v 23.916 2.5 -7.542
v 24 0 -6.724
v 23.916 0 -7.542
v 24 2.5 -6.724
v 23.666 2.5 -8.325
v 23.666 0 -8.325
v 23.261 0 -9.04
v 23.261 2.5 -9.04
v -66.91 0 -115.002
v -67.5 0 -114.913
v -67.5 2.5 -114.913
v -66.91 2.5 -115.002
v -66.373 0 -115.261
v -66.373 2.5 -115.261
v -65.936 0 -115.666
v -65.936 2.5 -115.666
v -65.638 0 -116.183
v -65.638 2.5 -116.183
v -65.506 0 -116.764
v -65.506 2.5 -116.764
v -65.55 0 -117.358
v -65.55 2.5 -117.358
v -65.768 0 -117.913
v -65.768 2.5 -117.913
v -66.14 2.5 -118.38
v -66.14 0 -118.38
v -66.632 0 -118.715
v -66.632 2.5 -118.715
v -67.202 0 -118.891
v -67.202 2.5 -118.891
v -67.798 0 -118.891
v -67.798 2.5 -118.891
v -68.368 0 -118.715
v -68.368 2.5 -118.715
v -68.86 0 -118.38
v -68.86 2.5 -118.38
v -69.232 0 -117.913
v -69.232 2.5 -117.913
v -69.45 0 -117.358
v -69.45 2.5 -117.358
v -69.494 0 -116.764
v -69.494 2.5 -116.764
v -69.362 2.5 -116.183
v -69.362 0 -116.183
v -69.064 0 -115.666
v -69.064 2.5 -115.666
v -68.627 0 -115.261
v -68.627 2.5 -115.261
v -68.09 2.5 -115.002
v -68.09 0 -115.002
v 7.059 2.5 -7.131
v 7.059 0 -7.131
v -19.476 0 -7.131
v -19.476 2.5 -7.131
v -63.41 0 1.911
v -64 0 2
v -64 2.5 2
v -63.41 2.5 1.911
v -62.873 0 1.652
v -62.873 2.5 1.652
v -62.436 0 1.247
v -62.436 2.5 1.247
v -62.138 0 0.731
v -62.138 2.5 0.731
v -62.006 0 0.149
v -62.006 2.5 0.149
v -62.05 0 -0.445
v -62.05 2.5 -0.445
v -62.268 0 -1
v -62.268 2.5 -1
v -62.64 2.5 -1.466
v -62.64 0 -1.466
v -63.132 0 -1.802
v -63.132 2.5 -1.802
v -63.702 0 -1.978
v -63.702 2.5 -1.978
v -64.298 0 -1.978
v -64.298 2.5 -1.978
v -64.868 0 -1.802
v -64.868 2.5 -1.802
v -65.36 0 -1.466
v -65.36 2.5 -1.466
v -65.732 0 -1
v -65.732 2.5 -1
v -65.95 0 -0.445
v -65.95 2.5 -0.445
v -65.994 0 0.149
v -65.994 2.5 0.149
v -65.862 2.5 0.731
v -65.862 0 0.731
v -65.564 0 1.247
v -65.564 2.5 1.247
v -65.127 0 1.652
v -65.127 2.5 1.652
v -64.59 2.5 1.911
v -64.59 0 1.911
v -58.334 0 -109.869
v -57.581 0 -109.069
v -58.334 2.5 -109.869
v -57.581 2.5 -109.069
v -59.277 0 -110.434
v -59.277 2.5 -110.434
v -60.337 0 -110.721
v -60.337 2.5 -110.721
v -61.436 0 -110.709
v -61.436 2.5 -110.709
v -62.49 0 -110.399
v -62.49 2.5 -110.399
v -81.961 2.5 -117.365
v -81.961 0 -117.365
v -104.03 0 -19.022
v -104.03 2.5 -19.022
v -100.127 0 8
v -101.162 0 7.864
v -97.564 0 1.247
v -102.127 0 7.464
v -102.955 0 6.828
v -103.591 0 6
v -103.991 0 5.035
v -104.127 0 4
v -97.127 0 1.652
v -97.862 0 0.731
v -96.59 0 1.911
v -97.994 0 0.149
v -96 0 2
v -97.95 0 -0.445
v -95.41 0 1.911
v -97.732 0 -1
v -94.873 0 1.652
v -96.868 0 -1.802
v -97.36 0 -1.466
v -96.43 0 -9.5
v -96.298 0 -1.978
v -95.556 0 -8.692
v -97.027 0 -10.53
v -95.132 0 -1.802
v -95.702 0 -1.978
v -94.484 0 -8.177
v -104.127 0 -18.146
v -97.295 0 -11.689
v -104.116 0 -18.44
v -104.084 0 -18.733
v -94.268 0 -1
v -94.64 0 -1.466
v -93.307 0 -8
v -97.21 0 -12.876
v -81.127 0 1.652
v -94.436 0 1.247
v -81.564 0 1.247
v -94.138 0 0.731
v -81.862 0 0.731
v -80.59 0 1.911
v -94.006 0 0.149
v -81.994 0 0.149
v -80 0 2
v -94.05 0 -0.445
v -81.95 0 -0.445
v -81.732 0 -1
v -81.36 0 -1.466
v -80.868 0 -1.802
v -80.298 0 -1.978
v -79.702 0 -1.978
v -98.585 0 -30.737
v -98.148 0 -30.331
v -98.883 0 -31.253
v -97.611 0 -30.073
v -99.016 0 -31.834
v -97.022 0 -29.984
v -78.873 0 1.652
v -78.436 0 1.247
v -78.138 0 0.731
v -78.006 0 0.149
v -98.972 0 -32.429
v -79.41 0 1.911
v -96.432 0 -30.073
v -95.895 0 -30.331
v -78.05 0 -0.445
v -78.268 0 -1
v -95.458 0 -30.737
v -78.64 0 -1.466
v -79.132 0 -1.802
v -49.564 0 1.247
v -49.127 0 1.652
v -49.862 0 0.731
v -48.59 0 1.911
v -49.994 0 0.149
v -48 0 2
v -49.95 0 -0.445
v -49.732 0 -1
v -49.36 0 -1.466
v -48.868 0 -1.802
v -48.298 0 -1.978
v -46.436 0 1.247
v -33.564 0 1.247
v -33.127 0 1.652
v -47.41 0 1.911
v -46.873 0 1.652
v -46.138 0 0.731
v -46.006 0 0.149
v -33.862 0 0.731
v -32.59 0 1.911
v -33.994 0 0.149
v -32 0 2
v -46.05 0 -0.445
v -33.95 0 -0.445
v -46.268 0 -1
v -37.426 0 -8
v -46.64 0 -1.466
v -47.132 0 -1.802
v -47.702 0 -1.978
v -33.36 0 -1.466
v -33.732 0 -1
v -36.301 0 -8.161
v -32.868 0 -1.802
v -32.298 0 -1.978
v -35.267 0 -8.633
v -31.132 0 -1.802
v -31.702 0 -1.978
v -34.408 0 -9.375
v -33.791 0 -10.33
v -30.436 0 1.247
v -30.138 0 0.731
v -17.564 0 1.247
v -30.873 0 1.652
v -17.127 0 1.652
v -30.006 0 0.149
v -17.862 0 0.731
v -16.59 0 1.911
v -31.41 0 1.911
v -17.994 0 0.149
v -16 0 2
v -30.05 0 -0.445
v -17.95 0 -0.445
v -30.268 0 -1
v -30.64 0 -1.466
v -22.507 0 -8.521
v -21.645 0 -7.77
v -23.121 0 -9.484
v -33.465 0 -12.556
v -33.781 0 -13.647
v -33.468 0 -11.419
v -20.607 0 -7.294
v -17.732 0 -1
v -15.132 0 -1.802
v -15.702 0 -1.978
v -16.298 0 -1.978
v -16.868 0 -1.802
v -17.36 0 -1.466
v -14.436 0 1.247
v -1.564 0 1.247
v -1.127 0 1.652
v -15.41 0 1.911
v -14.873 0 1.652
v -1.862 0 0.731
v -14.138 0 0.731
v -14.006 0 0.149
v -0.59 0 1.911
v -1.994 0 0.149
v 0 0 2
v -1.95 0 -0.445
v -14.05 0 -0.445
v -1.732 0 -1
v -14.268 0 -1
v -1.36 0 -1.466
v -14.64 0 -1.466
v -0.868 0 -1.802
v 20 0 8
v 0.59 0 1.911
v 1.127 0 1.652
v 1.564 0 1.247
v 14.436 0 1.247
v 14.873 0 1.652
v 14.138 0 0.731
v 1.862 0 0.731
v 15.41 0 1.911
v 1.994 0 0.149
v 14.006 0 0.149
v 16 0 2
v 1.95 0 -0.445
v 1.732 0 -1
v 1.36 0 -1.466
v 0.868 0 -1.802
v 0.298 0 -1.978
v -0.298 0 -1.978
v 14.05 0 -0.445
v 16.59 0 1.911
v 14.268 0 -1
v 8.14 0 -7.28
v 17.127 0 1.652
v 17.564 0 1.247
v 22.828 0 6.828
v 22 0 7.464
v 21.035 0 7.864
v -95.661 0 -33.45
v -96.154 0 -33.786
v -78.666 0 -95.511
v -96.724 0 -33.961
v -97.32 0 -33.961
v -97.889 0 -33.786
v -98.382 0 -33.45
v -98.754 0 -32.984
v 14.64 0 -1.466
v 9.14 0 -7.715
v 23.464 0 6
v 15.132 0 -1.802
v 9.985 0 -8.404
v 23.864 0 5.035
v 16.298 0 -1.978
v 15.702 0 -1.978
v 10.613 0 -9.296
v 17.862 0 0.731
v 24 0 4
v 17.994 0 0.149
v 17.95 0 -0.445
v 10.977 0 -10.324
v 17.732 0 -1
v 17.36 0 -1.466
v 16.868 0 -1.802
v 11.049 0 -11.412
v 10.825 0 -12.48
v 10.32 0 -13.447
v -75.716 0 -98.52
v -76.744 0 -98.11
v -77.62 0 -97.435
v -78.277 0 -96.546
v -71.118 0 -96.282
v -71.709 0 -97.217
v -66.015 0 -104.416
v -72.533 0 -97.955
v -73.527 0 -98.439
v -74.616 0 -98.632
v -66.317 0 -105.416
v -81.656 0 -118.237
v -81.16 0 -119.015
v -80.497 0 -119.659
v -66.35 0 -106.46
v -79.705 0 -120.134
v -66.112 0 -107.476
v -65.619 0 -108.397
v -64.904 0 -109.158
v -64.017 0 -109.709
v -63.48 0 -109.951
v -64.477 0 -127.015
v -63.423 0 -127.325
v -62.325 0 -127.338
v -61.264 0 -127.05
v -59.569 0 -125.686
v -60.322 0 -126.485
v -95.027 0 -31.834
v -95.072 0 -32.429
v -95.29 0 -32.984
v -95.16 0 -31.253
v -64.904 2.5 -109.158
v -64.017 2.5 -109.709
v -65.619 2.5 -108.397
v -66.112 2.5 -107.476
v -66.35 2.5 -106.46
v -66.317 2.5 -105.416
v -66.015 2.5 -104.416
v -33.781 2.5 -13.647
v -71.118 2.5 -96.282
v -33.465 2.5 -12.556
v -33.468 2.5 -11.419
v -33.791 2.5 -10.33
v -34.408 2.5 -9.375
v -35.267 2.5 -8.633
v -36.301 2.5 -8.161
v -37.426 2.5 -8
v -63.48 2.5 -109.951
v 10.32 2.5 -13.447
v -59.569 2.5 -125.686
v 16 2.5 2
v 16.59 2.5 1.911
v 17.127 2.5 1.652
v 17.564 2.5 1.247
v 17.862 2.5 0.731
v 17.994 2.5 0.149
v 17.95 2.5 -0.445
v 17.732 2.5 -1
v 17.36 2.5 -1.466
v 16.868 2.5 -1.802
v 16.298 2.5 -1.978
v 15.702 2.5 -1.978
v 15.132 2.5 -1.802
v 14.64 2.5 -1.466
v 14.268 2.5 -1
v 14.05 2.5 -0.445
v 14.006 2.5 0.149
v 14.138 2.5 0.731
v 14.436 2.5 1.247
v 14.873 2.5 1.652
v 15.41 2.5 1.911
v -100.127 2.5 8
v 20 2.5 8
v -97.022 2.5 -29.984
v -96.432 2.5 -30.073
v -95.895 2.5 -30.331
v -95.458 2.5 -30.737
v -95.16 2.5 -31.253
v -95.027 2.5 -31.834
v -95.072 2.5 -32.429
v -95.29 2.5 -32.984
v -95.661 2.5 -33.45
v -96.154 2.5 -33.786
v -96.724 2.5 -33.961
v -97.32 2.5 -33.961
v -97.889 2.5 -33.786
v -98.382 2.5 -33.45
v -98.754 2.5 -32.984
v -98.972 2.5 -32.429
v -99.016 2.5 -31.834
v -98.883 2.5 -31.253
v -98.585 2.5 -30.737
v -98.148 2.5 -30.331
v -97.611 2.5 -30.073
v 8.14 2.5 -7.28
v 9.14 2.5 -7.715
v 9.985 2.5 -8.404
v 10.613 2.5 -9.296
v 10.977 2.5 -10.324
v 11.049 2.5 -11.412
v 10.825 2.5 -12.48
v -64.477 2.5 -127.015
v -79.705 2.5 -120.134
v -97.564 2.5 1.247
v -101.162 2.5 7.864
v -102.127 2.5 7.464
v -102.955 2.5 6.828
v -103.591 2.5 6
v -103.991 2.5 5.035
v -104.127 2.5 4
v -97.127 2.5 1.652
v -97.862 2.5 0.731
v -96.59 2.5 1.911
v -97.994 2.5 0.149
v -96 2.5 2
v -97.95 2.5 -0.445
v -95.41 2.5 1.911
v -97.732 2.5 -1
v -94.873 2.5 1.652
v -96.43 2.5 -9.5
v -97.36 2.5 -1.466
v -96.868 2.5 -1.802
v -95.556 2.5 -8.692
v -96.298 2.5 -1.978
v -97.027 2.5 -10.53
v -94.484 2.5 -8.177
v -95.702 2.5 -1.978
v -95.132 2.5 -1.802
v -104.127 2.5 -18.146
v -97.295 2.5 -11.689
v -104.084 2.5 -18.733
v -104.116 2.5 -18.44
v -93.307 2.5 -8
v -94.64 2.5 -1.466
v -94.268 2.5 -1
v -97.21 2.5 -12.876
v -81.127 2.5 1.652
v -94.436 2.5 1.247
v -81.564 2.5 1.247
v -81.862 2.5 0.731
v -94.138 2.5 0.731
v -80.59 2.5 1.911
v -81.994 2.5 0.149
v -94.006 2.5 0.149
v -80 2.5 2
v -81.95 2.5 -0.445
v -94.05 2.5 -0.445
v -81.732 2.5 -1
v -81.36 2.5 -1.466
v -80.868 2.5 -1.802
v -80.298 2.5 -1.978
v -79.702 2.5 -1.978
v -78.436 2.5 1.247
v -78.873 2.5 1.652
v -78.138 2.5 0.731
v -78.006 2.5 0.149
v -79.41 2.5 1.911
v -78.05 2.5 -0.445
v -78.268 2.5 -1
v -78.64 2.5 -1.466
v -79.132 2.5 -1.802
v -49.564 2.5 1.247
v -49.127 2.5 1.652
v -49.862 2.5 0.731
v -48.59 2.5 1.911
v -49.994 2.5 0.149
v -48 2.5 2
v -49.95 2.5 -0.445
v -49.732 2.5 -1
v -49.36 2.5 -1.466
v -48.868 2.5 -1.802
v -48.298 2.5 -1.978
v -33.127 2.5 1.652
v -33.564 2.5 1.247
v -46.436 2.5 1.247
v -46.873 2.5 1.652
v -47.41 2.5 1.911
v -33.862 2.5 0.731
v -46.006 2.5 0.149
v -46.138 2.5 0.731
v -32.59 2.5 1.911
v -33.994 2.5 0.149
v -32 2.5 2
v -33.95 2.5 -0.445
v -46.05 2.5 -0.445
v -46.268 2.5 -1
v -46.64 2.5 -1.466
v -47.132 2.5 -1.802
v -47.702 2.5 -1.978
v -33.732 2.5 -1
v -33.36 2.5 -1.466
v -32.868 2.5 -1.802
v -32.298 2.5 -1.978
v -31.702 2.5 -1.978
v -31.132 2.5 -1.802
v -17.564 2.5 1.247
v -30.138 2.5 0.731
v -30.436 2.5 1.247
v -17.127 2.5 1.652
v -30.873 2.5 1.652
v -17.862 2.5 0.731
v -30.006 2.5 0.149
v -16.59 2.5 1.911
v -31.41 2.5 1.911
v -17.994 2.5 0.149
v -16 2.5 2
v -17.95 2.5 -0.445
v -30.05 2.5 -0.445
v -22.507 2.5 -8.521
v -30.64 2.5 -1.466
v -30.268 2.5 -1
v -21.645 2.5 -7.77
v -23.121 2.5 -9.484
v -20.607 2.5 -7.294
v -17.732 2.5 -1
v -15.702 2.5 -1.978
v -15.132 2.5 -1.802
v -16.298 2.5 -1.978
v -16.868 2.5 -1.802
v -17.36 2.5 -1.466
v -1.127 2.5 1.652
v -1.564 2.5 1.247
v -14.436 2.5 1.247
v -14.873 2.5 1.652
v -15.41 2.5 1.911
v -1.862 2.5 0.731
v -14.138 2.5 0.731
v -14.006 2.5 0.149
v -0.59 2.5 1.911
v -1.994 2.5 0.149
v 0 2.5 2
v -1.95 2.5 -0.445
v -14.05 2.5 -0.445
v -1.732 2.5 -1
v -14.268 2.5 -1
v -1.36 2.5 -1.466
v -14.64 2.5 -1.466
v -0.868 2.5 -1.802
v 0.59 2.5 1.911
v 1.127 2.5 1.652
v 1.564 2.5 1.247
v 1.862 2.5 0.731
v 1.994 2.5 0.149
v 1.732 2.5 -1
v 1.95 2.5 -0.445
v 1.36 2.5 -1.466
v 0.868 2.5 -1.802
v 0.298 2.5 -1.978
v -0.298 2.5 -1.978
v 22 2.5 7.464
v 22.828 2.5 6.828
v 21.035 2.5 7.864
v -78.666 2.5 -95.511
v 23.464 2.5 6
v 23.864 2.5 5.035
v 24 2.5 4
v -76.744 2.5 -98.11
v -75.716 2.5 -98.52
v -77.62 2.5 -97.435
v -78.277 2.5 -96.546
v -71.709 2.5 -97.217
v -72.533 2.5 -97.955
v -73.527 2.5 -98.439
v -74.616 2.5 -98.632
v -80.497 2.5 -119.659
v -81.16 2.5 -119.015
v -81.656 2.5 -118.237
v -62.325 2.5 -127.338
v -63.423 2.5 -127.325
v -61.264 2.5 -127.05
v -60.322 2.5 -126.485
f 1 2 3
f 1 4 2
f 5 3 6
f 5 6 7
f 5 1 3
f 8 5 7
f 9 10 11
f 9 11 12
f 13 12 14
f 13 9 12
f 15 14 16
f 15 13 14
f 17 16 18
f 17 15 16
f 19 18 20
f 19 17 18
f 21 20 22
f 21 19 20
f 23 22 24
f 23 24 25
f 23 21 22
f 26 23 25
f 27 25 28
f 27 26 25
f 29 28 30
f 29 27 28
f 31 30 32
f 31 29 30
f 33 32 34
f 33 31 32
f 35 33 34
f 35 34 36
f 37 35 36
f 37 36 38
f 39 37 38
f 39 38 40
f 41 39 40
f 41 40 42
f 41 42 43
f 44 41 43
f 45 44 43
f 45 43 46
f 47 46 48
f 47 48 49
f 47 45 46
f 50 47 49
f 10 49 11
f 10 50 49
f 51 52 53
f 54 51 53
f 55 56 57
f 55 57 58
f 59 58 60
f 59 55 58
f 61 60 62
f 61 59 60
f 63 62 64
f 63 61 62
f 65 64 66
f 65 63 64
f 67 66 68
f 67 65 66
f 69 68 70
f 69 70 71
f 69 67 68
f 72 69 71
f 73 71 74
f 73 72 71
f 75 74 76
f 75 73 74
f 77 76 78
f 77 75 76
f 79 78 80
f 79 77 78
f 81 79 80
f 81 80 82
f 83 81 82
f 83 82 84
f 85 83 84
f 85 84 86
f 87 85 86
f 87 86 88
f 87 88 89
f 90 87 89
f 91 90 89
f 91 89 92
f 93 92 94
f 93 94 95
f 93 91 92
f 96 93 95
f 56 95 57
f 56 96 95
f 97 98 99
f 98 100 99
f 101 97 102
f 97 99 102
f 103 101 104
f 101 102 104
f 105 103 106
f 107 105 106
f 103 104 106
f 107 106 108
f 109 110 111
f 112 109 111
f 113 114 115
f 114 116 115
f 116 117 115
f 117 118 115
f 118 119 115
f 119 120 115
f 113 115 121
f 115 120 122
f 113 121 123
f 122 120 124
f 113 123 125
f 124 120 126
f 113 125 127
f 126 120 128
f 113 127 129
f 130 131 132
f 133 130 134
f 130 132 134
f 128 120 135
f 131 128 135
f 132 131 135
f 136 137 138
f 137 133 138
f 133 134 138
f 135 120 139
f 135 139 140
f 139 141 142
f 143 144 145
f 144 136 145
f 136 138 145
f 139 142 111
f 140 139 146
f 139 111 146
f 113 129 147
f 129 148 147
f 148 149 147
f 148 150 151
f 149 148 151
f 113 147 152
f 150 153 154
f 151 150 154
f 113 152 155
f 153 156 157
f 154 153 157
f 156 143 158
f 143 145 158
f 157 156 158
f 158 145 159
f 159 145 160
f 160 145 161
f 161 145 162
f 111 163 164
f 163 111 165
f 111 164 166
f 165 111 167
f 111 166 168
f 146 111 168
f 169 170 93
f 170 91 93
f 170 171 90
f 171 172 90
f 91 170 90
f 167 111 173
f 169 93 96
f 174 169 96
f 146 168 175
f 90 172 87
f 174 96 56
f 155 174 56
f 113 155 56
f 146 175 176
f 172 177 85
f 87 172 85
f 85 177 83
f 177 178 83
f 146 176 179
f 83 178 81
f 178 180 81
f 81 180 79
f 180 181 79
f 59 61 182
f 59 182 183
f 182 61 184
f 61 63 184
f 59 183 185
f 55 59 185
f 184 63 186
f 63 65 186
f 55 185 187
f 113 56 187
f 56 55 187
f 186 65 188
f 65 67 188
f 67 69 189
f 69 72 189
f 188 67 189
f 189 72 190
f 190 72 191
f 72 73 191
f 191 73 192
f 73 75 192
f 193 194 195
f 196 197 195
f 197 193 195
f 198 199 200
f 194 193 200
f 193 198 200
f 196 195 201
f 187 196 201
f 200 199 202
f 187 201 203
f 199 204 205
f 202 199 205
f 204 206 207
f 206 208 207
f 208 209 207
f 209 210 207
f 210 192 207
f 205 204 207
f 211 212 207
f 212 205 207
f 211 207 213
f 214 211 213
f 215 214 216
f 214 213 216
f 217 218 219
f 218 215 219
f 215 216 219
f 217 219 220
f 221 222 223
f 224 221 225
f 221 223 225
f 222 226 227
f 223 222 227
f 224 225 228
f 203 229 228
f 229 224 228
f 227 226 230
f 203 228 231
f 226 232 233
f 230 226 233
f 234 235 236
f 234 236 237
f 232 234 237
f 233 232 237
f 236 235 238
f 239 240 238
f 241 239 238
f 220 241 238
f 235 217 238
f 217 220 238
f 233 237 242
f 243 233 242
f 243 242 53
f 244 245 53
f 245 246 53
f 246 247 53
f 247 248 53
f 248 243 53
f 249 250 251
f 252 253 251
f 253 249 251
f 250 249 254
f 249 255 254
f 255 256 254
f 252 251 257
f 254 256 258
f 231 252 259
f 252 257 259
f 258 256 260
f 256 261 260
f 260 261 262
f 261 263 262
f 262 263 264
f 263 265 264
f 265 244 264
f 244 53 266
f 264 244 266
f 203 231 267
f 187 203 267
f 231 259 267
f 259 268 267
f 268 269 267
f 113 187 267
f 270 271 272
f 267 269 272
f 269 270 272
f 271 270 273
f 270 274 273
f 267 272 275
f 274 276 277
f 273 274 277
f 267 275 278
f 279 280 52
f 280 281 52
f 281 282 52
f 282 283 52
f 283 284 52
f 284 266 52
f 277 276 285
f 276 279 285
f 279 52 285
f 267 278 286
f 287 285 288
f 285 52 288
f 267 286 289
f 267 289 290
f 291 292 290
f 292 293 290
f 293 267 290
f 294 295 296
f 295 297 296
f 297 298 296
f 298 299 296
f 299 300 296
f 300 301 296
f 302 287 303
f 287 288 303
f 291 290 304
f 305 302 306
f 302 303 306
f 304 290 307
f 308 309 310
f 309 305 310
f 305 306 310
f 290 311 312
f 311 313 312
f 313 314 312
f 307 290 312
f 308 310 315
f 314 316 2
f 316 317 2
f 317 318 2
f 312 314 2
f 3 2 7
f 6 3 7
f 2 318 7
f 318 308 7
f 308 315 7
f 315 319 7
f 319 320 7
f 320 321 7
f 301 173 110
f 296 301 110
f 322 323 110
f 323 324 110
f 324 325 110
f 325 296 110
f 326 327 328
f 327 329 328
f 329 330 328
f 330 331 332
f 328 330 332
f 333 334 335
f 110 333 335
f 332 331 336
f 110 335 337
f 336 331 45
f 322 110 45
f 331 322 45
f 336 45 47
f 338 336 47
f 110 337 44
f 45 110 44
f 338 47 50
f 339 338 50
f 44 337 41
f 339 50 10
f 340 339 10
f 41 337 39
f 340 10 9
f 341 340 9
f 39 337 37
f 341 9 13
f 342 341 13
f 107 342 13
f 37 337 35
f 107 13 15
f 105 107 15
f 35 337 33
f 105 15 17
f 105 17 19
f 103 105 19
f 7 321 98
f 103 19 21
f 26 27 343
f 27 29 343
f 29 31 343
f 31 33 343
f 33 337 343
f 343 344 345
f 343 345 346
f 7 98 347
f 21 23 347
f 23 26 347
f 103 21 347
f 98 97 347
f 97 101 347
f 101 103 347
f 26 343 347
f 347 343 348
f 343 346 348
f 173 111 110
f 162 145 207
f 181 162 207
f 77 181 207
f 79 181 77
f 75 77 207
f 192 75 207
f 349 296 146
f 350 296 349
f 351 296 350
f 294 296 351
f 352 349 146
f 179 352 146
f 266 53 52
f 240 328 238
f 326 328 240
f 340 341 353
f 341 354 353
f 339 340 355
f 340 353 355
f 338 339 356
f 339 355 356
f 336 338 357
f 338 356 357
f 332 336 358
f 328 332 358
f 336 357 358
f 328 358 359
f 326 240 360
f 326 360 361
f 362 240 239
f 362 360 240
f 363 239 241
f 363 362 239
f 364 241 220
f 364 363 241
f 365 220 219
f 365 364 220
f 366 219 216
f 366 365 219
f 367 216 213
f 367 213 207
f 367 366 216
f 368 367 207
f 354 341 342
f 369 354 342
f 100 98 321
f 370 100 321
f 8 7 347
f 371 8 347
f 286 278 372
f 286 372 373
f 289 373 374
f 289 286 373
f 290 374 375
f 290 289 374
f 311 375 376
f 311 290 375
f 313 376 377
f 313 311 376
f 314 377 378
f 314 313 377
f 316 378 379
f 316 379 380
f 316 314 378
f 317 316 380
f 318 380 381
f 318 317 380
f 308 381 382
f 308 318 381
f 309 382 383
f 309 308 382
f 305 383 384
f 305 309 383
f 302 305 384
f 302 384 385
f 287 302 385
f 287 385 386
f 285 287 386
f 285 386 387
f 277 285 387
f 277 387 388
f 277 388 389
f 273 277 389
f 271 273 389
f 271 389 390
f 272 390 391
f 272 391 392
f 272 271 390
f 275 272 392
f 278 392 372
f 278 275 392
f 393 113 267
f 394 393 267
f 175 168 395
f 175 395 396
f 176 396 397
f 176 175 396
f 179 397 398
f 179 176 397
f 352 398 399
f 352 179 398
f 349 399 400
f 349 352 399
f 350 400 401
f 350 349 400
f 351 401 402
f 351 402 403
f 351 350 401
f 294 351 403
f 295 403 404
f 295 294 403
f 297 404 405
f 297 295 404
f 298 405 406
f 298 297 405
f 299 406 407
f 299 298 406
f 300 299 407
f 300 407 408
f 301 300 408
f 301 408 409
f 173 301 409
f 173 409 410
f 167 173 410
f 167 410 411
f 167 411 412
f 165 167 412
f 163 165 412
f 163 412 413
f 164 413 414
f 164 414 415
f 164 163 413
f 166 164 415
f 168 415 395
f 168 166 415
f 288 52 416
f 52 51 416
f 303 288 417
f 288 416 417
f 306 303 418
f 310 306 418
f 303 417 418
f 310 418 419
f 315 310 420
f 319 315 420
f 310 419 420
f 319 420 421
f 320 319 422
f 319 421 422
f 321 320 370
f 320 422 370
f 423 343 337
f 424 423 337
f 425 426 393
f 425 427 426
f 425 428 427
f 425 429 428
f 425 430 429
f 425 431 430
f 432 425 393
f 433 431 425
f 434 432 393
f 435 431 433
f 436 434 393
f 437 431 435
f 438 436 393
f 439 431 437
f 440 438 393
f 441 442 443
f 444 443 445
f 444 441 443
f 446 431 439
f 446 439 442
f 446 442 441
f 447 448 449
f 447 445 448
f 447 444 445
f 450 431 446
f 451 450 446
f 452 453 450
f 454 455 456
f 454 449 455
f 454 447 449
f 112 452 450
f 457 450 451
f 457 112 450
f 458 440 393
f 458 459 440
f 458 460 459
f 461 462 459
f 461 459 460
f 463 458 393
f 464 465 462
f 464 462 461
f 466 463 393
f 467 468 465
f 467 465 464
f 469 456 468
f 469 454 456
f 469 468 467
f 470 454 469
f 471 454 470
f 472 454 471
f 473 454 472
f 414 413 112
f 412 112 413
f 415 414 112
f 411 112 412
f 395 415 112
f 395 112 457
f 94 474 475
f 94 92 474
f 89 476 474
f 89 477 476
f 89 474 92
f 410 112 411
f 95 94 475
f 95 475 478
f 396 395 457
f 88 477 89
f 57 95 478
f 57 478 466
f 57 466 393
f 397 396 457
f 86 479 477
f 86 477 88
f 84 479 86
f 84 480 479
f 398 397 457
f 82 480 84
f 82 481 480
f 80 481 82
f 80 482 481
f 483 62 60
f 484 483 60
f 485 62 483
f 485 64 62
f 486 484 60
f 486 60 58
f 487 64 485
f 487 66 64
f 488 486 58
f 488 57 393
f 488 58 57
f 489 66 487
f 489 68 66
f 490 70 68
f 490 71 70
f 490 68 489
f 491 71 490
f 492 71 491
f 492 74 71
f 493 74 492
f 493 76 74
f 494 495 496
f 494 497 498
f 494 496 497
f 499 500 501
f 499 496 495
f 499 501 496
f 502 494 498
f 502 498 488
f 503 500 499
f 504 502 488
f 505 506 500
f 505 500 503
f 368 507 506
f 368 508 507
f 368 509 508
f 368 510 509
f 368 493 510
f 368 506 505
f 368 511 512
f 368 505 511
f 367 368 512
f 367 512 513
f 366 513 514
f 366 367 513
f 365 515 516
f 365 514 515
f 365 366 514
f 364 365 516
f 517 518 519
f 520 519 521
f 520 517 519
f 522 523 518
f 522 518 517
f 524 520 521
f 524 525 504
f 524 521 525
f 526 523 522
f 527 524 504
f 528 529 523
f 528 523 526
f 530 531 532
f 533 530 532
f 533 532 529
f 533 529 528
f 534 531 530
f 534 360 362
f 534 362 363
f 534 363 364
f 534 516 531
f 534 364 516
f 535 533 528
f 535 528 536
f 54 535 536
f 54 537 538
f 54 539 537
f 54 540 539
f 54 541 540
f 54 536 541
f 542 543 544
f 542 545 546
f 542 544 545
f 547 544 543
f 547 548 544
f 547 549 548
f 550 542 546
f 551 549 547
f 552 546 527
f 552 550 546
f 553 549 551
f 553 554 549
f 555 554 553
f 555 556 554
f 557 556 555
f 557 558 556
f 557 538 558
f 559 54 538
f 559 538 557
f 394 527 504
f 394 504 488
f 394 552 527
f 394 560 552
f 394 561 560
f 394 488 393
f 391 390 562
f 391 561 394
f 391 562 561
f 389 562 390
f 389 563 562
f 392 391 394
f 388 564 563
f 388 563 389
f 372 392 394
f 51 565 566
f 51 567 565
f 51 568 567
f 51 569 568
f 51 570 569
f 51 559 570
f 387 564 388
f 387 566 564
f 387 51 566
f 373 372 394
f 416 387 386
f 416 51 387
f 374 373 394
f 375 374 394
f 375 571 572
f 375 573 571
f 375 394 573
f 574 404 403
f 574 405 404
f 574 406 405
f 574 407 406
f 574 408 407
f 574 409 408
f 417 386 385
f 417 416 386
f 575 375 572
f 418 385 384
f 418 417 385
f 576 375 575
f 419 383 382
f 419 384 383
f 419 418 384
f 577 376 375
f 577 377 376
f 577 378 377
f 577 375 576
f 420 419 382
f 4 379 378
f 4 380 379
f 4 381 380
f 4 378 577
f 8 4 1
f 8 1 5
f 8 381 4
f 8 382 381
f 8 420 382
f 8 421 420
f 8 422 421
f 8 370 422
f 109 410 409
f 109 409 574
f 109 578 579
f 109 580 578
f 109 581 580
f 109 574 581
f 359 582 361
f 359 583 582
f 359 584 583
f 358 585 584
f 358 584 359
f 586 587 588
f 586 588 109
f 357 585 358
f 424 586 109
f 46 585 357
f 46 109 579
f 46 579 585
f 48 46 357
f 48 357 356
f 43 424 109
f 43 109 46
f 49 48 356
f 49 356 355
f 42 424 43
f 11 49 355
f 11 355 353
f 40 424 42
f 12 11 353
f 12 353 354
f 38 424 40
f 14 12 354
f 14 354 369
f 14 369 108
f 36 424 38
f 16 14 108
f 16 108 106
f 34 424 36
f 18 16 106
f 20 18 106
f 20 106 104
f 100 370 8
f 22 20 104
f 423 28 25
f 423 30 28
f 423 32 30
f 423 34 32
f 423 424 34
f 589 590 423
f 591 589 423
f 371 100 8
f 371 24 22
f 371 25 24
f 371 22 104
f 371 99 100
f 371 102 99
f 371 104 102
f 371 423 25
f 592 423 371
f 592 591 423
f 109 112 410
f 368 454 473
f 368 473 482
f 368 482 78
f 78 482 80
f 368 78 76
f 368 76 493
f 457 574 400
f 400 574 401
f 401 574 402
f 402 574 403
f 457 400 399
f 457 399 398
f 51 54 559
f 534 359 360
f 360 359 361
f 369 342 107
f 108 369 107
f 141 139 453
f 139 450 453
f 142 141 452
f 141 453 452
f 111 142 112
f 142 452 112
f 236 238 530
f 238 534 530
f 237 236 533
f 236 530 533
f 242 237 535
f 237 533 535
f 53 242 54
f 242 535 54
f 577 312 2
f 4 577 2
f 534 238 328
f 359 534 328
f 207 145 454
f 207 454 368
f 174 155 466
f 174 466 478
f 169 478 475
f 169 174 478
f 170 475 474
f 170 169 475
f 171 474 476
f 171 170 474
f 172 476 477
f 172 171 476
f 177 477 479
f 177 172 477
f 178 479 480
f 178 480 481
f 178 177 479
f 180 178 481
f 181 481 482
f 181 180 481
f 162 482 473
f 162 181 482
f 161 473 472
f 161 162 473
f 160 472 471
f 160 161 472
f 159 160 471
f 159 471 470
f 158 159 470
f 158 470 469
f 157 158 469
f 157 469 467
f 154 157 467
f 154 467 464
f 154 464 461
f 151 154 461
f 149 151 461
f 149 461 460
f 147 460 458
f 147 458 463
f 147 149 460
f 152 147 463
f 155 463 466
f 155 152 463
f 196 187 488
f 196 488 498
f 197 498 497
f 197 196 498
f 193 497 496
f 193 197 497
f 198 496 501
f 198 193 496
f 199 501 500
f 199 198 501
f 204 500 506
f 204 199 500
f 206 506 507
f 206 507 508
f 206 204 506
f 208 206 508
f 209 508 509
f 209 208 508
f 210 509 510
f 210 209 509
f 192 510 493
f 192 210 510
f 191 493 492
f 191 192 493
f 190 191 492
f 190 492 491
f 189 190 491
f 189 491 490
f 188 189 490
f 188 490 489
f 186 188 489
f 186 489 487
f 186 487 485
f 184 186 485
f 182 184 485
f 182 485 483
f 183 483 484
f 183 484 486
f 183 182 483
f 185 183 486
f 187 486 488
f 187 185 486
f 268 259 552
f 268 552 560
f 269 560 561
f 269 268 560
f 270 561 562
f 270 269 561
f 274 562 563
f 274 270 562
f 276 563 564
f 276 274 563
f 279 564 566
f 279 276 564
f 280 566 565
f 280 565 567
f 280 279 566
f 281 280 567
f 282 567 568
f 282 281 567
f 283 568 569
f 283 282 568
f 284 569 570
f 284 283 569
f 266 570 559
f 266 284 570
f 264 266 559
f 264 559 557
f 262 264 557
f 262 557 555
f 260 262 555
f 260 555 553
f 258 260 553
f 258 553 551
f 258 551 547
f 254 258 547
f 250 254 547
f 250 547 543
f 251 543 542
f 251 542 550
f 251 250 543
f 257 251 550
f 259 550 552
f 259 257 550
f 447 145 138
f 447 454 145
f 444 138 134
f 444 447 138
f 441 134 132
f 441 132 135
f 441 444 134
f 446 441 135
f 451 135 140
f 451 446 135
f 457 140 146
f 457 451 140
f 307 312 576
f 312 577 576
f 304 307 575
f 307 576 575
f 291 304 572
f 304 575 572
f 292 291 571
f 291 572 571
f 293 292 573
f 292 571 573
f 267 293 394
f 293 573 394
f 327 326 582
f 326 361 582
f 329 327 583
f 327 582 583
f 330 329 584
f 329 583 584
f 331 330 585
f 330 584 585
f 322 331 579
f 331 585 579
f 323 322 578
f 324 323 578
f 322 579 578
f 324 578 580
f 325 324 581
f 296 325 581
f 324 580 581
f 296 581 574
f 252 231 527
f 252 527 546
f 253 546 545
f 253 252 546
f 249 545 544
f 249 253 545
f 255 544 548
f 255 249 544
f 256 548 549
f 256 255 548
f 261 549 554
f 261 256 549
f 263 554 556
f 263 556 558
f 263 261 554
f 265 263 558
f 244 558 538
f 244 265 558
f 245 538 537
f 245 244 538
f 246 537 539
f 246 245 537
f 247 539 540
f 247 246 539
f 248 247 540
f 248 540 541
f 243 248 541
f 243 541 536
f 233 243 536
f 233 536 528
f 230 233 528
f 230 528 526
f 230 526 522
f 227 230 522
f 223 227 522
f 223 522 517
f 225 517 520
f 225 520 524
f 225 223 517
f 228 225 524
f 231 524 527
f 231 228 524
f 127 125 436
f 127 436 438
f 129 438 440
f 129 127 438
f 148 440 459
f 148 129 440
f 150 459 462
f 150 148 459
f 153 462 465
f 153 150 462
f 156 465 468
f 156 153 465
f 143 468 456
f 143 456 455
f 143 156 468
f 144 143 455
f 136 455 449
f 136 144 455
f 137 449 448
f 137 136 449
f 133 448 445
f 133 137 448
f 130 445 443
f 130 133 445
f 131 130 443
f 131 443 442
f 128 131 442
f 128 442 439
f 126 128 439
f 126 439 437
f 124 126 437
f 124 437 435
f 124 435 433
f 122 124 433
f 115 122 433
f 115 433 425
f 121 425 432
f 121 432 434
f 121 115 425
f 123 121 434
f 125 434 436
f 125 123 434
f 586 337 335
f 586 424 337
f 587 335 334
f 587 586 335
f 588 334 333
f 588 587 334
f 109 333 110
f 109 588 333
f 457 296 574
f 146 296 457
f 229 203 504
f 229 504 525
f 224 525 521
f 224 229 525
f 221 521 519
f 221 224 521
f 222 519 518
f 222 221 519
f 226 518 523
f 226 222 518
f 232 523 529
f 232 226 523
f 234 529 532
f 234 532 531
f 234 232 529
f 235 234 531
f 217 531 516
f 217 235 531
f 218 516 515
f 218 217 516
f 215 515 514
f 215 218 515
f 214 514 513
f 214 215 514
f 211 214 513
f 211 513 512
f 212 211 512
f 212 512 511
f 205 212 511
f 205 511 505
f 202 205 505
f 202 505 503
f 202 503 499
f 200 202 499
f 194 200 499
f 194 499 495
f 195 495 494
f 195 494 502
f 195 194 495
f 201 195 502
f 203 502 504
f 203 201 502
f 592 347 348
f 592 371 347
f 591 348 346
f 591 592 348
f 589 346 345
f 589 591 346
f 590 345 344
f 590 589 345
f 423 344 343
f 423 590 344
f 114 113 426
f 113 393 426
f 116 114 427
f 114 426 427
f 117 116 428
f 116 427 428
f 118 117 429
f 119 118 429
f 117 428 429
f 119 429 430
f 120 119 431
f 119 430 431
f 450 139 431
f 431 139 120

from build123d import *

# Parameters (mm, degrees)
SKETCH1_R           = 2
BOSS_EXTRUDE1_DEPTH = 2.5
FILLET2_R           = 4


with BuildPart() as part:
    # Sketch1 → Boss-Extrude1 (new body)
    with BuildSketch(Plane(origin=(0, 0, 0), x_dir=(1, 0, 0), z_dir=(0, 1, 0))):
        Polygon((-24, -8), (24, -8), (24, 8), (-61.475760907, 128.370940703), (-81.524239093, 119.312324779), (-104.126855641, 18.58956294), (-104.126855641, -8), (-86.093666761, -8), align=None)
        with Locations(Location((-16, 0, 0), (0, 0, 270))):
            Circle(SKETCH1_R, mode=Mode.SUBTRACT)
        with Locations(Location((16, 0, 0), (0, 0, 270))):
            Circle(SKETCH1_R, mode=Mode.SUBTRACT)
        with Locations(Location((0, 0, 0), (0, 0, 270))):
            Circle(SKETCH1_R, mode=Mode.SUBTRACT)
        with Locations(Location((-67.5, 116.913429511, 0), (0, 0, 270))):
            Circle(SKETCH1_R, mode=Mode.SUBTRACT)
        with Locations(Location((-32, 0, 0), (0, 0, 270))):
            Circle(SKETCH1_R, mode=Mode.SUBTRACT)
        with Locations(Location((-48, 0, 0), (0, 0, 270))):
            Circle(SKETCH1_R, mode=Mode.SUBTRACT)
        with Locations(Location((-64, 0, 0), (0, 0, 270))):
            Circle(SKETCH1_R, mode=Mode.SUBTRACT)
        with Locations(Location((-80, 0, 0), (0, 0, 270))):
            Circle(SKETCH1_R, mode=Mode.SUBTRACT)
        with Locations(Location((-96, 0, 0), (0, 0, 270))):
            Circle(SKETCH1_R, mode=Mode.SUBTRACT)
        with Locations(Location((-97.021679837, 31.983686003, 0), (0, 0, 270))):
            Circle(SKETCH1_R, mode=Mode.SUBTRACT)
        Polygon((-31.229369404, 8), (-76.046035256, 107.187994635), (-98.304243511, 8), align=None, mode=Mode.SUBTRACT)
        Polygon((-63.480229926, 109.950983508), (-59.488316608, 111.754672009), (14.80532848, 7.130906714), (-22.057960952, 7.130906714), (-67.661999872, 108.061511027), align=None, mode=Mode.SUBTRACT)
    extrude(amount=BOSS_EXTRUDE1_DEPTH)

    # Fillet2
    fillet2_edges = [part.edges().sort_by_distance(p)[0] for p in [
        (24, 1.25, -8),
        (24, 1.25, 8),
        (-104.126855641, 1.25, 8),
        (-104.126855641, 1.25, -18.58956294),
        (-81.524239093, 1.25, -119.312324779),
        (-61.475760907, 1.25, -128.370940703),
        (-67.661999872, 1.25, -108.061511027),
        (-22.057960952, 1.25, -7.130906714),
        (14.80532848, 1.25, -7.130906714),
        (-59.488316608, 1.25, -111.754672009),
        (-98.304243511, 1.25, -8),
        (-31.229369404, 1.25, -8),
        (-76.046035256, 1.25, -107.187994635),
    ]]
    fillet(fillet2_edges, radius=FILLET2_R)


solid = part.part
